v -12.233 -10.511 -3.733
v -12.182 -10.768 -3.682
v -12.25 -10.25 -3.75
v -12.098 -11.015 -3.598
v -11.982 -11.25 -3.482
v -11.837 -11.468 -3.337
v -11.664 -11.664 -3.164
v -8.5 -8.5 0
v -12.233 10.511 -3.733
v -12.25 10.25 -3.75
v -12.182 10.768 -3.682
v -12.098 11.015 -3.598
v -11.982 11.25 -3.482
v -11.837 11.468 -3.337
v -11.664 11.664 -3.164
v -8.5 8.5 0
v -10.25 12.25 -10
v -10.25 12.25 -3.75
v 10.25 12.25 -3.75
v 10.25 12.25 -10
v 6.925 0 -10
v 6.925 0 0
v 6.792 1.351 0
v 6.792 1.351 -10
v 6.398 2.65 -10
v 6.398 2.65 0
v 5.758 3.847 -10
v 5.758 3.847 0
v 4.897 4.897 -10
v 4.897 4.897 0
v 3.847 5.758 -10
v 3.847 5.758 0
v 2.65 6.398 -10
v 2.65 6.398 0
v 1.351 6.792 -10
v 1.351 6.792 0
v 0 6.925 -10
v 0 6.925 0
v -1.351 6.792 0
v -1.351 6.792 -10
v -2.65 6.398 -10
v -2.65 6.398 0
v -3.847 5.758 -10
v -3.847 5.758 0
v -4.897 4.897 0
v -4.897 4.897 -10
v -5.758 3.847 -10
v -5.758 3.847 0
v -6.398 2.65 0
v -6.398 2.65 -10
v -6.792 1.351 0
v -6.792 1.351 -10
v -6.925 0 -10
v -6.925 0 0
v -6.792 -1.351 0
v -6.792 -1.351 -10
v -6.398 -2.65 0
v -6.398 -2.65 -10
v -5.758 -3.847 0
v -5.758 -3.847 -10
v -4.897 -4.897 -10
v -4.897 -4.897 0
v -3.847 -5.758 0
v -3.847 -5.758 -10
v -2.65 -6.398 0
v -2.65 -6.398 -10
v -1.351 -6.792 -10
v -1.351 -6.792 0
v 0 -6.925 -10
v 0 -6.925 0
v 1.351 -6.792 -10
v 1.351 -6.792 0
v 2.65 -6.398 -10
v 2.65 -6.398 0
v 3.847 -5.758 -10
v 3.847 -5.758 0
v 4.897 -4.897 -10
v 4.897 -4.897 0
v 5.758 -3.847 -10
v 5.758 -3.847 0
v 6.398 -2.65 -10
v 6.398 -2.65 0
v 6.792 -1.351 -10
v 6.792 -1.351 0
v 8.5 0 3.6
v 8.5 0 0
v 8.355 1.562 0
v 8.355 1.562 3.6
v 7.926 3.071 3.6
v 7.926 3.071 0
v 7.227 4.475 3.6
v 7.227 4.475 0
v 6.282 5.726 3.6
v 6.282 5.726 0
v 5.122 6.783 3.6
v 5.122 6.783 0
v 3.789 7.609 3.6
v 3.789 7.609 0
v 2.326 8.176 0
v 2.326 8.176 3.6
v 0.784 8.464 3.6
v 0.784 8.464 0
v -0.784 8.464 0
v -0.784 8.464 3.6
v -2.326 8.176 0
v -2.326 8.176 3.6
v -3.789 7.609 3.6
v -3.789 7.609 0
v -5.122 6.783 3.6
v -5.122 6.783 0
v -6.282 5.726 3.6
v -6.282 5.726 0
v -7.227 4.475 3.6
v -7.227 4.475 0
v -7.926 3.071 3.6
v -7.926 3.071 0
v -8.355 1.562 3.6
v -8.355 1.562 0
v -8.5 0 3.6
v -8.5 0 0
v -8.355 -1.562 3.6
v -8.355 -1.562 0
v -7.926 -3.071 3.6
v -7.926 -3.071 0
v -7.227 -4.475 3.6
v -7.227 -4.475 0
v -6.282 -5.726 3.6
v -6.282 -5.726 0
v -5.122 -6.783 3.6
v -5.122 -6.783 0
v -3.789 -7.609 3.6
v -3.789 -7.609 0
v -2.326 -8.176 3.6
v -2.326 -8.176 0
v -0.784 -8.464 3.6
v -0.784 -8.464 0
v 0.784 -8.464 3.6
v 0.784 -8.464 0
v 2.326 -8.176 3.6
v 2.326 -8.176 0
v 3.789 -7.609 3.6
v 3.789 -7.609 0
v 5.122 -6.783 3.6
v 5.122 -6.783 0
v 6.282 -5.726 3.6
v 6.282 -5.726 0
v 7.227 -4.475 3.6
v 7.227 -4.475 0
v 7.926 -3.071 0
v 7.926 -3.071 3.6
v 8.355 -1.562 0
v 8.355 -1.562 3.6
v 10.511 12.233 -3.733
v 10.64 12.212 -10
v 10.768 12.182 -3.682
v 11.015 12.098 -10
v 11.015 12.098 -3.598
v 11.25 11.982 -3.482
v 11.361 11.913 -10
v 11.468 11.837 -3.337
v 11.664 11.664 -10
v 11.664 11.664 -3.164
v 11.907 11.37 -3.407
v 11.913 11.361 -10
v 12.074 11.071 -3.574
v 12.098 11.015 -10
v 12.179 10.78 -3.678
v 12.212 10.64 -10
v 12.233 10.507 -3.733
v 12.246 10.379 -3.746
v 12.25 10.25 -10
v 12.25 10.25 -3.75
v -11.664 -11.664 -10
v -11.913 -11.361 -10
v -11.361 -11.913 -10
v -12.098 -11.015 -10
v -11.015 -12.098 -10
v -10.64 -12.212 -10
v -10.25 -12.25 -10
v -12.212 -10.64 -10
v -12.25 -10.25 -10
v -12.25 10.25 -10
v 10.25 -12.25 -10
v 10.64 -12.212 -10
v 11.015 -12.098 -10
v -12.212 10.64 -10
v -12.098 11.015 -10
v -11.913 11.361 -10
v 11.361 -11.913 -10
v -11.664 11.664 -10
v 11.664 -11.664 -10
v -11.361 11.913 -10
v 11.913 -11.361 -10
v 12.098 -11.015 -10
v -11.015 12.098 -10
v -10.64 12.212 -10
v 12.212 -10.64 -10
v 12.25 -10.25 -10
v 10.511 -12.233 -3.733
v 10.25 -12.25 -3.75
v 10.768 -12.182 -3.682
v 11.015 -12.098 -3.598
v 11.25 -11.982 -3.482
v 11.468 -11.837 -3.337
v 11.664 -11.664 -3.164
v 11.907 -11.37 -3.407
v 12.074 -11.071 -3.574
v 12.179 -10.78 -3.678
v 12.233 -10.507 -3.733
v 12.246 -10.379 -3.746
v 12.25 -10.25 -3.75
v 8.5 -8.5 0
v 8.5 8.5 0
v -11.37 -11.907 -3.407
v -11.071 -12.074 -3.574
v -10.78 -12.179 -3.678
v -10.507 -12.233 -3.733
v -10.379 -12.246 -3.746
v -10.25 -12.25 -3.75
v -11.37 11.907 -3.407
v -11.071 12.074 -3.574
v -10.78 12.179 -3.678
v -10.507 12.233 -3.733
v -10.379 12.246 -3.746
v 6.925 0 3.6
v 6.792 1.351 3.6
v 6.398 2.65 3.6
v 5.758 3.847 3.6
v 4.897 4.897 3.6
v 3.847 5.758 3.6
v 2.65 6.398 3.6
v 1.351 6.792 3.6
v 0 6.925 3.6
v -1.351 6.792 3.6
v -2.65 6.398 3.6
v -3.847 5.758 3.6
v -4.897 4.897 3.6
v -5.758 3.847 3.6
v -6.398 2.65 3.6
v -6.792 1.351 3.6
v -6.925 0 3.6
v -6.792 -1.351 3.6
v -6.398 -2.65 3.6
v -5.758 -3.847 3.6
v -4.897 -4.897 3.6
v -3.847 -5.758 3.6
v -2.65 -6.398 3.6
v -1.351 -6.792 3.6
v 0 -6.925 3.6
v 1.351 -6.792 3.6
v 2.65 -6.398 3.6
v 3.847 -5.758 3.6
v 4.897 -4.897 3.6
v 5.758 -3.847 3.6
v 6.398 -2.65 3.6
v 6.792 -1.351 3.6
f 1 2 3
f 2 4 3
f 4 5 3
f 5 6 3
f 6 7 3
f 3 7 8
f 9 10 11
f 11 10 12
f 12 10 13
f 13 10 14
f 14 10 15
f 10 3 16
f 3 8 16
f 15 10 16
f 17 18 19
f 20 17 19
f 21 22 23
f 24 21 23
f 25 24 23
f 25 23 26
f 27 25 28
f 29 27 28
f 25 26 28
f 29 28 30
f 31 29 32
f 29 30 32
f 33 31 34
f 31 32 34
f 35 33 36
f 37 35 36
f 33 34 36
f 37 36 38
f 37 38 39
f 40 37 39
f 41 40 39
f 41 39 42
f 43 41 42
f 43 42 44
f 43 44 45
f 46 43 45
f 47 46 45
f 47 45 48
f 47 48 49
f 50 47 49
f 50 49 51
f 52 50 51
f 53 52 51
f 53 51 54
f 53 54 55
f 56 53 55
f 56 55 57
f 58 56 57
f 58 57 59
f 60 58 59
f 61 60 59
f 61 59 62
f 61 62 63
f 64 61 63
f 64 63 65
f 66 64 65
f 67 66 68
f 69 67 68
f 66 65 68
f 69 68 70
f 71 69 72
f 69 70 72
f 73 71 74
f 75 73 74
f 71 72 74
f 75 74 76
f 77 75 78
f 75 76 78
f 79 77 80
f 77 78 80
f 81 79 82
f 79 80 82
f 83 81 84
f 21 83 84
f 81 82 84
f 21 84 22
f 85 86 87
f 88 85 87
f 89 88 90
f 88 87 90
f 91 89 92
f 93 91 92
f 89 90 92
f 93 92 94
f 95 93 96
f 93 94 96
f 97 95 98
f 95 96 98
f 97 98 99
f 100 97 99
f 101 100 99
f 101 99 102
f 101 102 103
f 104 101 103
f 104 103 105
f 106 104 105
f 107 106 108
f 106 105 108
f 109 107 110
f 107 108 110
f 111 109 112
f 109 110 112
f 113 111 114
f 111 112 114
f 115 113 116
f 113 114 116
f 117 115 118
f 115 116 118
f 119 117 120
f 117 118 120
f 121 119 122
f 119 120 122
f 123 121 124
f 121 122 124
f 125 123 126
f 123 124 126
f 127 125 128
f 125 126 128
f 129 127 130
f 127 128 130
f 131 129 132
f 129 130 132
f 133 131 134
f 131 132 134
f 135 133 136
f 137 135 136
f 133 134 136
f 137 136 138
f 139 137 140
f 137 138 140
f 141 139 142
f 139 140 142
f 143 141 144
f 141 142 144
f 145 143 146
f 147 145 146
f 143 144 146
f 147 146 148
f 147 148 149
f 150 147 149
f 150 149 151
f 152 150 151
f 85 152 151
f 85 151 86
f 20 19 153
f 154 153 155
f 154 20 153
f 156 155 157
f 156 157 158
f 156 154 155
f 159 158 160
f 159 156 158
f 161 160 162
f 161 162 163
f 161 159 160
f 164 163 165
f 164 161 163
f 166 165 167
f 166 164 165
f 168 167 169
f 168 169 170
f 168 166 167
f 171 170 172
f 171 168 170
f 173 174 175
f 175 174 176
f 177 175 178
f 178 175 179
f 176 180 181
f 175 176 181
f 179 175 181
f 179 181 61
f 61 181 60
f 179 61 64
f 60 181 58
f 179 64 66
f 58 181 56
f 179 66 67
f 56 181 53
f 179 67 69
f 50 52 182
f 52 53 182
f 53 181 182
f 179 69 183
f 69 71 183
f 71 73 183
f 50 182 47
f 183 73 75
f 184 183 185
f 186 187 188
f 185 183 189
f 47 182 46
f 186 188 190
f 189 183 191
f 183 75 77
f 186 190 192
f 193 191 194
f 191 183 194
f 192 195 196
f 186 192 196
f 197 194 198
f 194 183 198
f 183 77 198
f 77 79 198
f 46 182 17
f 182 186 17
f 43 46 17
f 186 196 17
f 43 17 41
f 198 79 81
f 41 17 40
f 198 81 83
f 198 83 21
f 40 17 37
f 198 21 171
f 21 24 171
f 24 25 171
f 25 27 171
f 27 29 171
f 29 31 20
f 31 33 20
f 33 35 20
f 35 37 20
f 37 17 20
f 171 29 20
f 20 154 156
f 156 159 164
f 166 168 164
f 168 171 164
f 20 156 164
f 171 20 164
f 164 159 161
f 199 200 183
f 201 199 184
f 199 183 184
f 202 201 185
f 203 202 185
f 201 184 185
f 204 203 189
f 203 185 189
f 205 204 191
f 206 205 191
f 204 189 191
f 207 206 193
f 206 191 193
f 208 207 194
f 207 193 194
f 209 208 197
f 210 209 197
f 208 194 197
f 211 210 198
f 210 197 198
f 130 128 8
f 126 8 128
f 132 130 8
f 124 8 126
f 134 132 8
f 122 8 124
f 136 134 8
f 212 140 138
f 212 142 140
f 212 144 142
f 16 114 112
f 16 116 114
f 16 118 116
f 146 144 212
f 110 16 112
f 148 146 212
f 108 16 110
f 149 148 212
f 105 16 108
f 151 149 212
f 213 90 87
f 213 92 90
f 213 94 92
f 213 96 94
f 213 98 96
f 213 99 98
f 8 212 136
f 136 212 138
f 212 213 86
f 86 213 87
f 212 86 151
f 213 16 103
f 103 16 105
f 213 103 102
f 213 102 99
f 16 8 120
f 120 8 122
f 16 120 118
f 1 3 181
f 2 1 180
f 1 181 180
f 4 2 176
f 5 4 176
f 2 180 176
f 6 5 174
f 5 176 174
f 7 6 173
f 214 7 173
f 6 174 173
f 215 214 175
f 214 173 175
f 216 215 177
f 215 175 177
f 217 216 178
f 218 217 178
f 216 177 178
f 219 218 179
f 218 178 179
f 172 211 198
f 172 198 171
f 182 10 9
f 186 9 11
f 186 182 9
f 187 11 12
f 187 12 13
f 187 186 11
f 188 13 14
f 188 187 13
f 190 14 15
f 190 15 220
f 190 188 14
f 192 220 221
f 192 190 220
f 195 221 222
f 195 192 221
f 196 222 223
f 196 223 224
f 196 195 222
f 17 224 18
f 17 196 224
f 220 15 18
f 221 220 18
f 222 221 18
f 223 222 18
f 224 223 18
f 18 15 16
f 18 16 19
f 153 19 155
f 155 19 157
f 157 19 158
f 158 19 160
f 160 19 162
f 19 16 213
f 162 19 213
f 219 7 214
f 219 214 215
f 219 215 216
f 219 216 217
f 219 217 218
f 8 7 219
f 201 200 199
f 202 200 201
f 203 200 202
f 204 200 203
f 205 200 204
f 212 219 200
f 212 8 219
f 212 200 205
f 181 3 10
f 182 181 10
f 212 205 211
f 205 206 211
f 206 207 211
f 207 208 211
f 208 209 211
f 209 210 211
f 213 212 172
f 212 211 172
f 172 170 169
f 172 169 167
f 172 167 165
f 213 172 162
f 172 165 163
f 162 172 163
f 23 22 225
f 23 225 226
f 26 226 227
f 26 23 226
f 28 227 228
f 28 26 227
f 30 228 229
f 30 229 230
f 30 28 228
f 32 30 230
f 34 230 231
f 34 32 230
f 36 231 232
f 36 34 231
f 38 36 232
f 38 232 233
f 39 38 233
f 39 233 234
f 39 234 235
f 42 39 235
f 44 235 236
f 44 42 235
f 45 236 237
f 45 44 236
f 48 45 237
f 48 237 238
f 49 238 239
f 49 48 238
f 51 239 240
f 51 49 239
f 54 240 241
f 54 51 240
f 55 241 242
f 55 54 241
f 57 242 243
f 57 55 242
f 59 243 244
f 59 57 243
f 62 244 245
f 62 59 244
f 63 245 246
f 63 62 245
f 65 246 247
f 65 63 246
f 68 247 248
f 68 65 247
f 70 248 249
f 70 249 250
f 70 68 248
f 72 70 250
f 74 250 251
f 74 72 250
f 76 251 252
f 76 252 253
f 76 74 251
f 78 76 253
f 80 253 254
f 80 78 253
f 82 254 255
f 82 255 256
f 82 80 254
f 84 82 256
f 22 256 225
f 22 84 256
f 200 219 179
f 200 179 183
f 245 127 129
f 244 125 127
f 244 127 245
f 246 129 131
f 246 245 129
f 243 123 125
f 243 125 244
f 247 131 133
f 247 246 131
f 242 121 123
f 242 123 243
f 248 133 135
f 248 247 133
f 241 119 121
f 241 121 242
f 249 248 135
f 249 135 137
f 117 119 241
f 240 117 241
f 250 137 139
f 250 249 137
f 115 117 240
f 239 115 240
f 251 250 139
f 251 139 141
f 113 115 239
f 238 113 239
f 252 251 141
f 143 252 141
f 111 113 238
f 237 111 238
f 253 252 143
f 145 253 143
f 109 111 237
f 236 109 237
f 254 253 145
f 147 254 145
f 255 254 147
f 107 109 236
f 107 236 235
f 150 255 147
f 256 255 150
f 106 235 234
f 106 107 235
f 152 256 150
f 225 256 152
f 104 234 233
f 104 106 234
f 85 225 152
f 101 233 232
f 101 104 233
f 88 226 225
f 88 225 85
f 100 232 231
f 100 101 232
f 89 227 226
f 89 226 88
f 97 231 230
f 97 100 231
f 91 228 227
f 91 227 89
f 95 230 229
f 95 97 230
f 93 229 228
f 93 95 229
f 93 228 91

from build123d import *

# Parameters (mm, degrees)
F0_W     = 24.5
F0_H     = 24.5
F0_R     = 8.5
F0_R_2   = 6.925
F1_DEPTH = 10
F2_DEPTH = 3.6
F3_DEPTH = 25
F4_SIZE2 = 3.74999
F4_SIZE  = 3.74999
F5_R     = 2


# Not quite as in the source:
# - a fillet or chamfer is up to 0.001 mm smaller than in the source, because OpenCascade refuses the exact size


with BuildPart() as f1:
    # F0 (on Top) → F1 (new body)
    with BuildSketch(Plane.XY):
        Rectangle(F0_W, F0_H)
        Circle(F0_R, mode=Mode.SUBTRACT)
        Circle(F0_R)
        Circle(F0_R_2, mode=Mode.SUBTRACT)
        Circle(F0_R_2)
    extrude(amount=-F1_DEPTH)

    # F0 (on Top) → F2 (join)
    with BuildSketch(Plane.XY):
        Circle(F0_R)
        Circle(F0_R_2, mode=Mode.SUBTRACT)
    extrude(amount=F2_DEPTH)

    # F0 (on Top) → F3 (cut)
    with BuildSketch(Plane.XY):
        Circle(F0_R_2)
    extrude(amount=-F3_DEPTH, mode=Mode.SUBTRACT)

    # F4 (size 3.75 and 3.75 in the source; OpenCascade refuses exactly that, so slightly less here)
    f4_edges = [f1.edges().sort_by_distance(p)[0] for p in [
        (0, -12.25, 0),
        (12.25, 0, 0),
        (0, 12.25, 0),
        (-12.25, 0, 0),
    ]]
    chamfer(f4_edges, length=F4_SIZE, length2=F4_SIZE2)

    # F5
    f5_edges = [f1.edges().sort_by_distance(p)[0] for p in [
        (12.25, -12.25, -6.874995),
        (12.25, 12.25, -6.874995),
        (-12.25, 12.25, -6.874995),
        (-12.25, -12.25, -6.874995),
    ]]
    fillet(f5_edges, radius=F5_R)


solid = f1.part
